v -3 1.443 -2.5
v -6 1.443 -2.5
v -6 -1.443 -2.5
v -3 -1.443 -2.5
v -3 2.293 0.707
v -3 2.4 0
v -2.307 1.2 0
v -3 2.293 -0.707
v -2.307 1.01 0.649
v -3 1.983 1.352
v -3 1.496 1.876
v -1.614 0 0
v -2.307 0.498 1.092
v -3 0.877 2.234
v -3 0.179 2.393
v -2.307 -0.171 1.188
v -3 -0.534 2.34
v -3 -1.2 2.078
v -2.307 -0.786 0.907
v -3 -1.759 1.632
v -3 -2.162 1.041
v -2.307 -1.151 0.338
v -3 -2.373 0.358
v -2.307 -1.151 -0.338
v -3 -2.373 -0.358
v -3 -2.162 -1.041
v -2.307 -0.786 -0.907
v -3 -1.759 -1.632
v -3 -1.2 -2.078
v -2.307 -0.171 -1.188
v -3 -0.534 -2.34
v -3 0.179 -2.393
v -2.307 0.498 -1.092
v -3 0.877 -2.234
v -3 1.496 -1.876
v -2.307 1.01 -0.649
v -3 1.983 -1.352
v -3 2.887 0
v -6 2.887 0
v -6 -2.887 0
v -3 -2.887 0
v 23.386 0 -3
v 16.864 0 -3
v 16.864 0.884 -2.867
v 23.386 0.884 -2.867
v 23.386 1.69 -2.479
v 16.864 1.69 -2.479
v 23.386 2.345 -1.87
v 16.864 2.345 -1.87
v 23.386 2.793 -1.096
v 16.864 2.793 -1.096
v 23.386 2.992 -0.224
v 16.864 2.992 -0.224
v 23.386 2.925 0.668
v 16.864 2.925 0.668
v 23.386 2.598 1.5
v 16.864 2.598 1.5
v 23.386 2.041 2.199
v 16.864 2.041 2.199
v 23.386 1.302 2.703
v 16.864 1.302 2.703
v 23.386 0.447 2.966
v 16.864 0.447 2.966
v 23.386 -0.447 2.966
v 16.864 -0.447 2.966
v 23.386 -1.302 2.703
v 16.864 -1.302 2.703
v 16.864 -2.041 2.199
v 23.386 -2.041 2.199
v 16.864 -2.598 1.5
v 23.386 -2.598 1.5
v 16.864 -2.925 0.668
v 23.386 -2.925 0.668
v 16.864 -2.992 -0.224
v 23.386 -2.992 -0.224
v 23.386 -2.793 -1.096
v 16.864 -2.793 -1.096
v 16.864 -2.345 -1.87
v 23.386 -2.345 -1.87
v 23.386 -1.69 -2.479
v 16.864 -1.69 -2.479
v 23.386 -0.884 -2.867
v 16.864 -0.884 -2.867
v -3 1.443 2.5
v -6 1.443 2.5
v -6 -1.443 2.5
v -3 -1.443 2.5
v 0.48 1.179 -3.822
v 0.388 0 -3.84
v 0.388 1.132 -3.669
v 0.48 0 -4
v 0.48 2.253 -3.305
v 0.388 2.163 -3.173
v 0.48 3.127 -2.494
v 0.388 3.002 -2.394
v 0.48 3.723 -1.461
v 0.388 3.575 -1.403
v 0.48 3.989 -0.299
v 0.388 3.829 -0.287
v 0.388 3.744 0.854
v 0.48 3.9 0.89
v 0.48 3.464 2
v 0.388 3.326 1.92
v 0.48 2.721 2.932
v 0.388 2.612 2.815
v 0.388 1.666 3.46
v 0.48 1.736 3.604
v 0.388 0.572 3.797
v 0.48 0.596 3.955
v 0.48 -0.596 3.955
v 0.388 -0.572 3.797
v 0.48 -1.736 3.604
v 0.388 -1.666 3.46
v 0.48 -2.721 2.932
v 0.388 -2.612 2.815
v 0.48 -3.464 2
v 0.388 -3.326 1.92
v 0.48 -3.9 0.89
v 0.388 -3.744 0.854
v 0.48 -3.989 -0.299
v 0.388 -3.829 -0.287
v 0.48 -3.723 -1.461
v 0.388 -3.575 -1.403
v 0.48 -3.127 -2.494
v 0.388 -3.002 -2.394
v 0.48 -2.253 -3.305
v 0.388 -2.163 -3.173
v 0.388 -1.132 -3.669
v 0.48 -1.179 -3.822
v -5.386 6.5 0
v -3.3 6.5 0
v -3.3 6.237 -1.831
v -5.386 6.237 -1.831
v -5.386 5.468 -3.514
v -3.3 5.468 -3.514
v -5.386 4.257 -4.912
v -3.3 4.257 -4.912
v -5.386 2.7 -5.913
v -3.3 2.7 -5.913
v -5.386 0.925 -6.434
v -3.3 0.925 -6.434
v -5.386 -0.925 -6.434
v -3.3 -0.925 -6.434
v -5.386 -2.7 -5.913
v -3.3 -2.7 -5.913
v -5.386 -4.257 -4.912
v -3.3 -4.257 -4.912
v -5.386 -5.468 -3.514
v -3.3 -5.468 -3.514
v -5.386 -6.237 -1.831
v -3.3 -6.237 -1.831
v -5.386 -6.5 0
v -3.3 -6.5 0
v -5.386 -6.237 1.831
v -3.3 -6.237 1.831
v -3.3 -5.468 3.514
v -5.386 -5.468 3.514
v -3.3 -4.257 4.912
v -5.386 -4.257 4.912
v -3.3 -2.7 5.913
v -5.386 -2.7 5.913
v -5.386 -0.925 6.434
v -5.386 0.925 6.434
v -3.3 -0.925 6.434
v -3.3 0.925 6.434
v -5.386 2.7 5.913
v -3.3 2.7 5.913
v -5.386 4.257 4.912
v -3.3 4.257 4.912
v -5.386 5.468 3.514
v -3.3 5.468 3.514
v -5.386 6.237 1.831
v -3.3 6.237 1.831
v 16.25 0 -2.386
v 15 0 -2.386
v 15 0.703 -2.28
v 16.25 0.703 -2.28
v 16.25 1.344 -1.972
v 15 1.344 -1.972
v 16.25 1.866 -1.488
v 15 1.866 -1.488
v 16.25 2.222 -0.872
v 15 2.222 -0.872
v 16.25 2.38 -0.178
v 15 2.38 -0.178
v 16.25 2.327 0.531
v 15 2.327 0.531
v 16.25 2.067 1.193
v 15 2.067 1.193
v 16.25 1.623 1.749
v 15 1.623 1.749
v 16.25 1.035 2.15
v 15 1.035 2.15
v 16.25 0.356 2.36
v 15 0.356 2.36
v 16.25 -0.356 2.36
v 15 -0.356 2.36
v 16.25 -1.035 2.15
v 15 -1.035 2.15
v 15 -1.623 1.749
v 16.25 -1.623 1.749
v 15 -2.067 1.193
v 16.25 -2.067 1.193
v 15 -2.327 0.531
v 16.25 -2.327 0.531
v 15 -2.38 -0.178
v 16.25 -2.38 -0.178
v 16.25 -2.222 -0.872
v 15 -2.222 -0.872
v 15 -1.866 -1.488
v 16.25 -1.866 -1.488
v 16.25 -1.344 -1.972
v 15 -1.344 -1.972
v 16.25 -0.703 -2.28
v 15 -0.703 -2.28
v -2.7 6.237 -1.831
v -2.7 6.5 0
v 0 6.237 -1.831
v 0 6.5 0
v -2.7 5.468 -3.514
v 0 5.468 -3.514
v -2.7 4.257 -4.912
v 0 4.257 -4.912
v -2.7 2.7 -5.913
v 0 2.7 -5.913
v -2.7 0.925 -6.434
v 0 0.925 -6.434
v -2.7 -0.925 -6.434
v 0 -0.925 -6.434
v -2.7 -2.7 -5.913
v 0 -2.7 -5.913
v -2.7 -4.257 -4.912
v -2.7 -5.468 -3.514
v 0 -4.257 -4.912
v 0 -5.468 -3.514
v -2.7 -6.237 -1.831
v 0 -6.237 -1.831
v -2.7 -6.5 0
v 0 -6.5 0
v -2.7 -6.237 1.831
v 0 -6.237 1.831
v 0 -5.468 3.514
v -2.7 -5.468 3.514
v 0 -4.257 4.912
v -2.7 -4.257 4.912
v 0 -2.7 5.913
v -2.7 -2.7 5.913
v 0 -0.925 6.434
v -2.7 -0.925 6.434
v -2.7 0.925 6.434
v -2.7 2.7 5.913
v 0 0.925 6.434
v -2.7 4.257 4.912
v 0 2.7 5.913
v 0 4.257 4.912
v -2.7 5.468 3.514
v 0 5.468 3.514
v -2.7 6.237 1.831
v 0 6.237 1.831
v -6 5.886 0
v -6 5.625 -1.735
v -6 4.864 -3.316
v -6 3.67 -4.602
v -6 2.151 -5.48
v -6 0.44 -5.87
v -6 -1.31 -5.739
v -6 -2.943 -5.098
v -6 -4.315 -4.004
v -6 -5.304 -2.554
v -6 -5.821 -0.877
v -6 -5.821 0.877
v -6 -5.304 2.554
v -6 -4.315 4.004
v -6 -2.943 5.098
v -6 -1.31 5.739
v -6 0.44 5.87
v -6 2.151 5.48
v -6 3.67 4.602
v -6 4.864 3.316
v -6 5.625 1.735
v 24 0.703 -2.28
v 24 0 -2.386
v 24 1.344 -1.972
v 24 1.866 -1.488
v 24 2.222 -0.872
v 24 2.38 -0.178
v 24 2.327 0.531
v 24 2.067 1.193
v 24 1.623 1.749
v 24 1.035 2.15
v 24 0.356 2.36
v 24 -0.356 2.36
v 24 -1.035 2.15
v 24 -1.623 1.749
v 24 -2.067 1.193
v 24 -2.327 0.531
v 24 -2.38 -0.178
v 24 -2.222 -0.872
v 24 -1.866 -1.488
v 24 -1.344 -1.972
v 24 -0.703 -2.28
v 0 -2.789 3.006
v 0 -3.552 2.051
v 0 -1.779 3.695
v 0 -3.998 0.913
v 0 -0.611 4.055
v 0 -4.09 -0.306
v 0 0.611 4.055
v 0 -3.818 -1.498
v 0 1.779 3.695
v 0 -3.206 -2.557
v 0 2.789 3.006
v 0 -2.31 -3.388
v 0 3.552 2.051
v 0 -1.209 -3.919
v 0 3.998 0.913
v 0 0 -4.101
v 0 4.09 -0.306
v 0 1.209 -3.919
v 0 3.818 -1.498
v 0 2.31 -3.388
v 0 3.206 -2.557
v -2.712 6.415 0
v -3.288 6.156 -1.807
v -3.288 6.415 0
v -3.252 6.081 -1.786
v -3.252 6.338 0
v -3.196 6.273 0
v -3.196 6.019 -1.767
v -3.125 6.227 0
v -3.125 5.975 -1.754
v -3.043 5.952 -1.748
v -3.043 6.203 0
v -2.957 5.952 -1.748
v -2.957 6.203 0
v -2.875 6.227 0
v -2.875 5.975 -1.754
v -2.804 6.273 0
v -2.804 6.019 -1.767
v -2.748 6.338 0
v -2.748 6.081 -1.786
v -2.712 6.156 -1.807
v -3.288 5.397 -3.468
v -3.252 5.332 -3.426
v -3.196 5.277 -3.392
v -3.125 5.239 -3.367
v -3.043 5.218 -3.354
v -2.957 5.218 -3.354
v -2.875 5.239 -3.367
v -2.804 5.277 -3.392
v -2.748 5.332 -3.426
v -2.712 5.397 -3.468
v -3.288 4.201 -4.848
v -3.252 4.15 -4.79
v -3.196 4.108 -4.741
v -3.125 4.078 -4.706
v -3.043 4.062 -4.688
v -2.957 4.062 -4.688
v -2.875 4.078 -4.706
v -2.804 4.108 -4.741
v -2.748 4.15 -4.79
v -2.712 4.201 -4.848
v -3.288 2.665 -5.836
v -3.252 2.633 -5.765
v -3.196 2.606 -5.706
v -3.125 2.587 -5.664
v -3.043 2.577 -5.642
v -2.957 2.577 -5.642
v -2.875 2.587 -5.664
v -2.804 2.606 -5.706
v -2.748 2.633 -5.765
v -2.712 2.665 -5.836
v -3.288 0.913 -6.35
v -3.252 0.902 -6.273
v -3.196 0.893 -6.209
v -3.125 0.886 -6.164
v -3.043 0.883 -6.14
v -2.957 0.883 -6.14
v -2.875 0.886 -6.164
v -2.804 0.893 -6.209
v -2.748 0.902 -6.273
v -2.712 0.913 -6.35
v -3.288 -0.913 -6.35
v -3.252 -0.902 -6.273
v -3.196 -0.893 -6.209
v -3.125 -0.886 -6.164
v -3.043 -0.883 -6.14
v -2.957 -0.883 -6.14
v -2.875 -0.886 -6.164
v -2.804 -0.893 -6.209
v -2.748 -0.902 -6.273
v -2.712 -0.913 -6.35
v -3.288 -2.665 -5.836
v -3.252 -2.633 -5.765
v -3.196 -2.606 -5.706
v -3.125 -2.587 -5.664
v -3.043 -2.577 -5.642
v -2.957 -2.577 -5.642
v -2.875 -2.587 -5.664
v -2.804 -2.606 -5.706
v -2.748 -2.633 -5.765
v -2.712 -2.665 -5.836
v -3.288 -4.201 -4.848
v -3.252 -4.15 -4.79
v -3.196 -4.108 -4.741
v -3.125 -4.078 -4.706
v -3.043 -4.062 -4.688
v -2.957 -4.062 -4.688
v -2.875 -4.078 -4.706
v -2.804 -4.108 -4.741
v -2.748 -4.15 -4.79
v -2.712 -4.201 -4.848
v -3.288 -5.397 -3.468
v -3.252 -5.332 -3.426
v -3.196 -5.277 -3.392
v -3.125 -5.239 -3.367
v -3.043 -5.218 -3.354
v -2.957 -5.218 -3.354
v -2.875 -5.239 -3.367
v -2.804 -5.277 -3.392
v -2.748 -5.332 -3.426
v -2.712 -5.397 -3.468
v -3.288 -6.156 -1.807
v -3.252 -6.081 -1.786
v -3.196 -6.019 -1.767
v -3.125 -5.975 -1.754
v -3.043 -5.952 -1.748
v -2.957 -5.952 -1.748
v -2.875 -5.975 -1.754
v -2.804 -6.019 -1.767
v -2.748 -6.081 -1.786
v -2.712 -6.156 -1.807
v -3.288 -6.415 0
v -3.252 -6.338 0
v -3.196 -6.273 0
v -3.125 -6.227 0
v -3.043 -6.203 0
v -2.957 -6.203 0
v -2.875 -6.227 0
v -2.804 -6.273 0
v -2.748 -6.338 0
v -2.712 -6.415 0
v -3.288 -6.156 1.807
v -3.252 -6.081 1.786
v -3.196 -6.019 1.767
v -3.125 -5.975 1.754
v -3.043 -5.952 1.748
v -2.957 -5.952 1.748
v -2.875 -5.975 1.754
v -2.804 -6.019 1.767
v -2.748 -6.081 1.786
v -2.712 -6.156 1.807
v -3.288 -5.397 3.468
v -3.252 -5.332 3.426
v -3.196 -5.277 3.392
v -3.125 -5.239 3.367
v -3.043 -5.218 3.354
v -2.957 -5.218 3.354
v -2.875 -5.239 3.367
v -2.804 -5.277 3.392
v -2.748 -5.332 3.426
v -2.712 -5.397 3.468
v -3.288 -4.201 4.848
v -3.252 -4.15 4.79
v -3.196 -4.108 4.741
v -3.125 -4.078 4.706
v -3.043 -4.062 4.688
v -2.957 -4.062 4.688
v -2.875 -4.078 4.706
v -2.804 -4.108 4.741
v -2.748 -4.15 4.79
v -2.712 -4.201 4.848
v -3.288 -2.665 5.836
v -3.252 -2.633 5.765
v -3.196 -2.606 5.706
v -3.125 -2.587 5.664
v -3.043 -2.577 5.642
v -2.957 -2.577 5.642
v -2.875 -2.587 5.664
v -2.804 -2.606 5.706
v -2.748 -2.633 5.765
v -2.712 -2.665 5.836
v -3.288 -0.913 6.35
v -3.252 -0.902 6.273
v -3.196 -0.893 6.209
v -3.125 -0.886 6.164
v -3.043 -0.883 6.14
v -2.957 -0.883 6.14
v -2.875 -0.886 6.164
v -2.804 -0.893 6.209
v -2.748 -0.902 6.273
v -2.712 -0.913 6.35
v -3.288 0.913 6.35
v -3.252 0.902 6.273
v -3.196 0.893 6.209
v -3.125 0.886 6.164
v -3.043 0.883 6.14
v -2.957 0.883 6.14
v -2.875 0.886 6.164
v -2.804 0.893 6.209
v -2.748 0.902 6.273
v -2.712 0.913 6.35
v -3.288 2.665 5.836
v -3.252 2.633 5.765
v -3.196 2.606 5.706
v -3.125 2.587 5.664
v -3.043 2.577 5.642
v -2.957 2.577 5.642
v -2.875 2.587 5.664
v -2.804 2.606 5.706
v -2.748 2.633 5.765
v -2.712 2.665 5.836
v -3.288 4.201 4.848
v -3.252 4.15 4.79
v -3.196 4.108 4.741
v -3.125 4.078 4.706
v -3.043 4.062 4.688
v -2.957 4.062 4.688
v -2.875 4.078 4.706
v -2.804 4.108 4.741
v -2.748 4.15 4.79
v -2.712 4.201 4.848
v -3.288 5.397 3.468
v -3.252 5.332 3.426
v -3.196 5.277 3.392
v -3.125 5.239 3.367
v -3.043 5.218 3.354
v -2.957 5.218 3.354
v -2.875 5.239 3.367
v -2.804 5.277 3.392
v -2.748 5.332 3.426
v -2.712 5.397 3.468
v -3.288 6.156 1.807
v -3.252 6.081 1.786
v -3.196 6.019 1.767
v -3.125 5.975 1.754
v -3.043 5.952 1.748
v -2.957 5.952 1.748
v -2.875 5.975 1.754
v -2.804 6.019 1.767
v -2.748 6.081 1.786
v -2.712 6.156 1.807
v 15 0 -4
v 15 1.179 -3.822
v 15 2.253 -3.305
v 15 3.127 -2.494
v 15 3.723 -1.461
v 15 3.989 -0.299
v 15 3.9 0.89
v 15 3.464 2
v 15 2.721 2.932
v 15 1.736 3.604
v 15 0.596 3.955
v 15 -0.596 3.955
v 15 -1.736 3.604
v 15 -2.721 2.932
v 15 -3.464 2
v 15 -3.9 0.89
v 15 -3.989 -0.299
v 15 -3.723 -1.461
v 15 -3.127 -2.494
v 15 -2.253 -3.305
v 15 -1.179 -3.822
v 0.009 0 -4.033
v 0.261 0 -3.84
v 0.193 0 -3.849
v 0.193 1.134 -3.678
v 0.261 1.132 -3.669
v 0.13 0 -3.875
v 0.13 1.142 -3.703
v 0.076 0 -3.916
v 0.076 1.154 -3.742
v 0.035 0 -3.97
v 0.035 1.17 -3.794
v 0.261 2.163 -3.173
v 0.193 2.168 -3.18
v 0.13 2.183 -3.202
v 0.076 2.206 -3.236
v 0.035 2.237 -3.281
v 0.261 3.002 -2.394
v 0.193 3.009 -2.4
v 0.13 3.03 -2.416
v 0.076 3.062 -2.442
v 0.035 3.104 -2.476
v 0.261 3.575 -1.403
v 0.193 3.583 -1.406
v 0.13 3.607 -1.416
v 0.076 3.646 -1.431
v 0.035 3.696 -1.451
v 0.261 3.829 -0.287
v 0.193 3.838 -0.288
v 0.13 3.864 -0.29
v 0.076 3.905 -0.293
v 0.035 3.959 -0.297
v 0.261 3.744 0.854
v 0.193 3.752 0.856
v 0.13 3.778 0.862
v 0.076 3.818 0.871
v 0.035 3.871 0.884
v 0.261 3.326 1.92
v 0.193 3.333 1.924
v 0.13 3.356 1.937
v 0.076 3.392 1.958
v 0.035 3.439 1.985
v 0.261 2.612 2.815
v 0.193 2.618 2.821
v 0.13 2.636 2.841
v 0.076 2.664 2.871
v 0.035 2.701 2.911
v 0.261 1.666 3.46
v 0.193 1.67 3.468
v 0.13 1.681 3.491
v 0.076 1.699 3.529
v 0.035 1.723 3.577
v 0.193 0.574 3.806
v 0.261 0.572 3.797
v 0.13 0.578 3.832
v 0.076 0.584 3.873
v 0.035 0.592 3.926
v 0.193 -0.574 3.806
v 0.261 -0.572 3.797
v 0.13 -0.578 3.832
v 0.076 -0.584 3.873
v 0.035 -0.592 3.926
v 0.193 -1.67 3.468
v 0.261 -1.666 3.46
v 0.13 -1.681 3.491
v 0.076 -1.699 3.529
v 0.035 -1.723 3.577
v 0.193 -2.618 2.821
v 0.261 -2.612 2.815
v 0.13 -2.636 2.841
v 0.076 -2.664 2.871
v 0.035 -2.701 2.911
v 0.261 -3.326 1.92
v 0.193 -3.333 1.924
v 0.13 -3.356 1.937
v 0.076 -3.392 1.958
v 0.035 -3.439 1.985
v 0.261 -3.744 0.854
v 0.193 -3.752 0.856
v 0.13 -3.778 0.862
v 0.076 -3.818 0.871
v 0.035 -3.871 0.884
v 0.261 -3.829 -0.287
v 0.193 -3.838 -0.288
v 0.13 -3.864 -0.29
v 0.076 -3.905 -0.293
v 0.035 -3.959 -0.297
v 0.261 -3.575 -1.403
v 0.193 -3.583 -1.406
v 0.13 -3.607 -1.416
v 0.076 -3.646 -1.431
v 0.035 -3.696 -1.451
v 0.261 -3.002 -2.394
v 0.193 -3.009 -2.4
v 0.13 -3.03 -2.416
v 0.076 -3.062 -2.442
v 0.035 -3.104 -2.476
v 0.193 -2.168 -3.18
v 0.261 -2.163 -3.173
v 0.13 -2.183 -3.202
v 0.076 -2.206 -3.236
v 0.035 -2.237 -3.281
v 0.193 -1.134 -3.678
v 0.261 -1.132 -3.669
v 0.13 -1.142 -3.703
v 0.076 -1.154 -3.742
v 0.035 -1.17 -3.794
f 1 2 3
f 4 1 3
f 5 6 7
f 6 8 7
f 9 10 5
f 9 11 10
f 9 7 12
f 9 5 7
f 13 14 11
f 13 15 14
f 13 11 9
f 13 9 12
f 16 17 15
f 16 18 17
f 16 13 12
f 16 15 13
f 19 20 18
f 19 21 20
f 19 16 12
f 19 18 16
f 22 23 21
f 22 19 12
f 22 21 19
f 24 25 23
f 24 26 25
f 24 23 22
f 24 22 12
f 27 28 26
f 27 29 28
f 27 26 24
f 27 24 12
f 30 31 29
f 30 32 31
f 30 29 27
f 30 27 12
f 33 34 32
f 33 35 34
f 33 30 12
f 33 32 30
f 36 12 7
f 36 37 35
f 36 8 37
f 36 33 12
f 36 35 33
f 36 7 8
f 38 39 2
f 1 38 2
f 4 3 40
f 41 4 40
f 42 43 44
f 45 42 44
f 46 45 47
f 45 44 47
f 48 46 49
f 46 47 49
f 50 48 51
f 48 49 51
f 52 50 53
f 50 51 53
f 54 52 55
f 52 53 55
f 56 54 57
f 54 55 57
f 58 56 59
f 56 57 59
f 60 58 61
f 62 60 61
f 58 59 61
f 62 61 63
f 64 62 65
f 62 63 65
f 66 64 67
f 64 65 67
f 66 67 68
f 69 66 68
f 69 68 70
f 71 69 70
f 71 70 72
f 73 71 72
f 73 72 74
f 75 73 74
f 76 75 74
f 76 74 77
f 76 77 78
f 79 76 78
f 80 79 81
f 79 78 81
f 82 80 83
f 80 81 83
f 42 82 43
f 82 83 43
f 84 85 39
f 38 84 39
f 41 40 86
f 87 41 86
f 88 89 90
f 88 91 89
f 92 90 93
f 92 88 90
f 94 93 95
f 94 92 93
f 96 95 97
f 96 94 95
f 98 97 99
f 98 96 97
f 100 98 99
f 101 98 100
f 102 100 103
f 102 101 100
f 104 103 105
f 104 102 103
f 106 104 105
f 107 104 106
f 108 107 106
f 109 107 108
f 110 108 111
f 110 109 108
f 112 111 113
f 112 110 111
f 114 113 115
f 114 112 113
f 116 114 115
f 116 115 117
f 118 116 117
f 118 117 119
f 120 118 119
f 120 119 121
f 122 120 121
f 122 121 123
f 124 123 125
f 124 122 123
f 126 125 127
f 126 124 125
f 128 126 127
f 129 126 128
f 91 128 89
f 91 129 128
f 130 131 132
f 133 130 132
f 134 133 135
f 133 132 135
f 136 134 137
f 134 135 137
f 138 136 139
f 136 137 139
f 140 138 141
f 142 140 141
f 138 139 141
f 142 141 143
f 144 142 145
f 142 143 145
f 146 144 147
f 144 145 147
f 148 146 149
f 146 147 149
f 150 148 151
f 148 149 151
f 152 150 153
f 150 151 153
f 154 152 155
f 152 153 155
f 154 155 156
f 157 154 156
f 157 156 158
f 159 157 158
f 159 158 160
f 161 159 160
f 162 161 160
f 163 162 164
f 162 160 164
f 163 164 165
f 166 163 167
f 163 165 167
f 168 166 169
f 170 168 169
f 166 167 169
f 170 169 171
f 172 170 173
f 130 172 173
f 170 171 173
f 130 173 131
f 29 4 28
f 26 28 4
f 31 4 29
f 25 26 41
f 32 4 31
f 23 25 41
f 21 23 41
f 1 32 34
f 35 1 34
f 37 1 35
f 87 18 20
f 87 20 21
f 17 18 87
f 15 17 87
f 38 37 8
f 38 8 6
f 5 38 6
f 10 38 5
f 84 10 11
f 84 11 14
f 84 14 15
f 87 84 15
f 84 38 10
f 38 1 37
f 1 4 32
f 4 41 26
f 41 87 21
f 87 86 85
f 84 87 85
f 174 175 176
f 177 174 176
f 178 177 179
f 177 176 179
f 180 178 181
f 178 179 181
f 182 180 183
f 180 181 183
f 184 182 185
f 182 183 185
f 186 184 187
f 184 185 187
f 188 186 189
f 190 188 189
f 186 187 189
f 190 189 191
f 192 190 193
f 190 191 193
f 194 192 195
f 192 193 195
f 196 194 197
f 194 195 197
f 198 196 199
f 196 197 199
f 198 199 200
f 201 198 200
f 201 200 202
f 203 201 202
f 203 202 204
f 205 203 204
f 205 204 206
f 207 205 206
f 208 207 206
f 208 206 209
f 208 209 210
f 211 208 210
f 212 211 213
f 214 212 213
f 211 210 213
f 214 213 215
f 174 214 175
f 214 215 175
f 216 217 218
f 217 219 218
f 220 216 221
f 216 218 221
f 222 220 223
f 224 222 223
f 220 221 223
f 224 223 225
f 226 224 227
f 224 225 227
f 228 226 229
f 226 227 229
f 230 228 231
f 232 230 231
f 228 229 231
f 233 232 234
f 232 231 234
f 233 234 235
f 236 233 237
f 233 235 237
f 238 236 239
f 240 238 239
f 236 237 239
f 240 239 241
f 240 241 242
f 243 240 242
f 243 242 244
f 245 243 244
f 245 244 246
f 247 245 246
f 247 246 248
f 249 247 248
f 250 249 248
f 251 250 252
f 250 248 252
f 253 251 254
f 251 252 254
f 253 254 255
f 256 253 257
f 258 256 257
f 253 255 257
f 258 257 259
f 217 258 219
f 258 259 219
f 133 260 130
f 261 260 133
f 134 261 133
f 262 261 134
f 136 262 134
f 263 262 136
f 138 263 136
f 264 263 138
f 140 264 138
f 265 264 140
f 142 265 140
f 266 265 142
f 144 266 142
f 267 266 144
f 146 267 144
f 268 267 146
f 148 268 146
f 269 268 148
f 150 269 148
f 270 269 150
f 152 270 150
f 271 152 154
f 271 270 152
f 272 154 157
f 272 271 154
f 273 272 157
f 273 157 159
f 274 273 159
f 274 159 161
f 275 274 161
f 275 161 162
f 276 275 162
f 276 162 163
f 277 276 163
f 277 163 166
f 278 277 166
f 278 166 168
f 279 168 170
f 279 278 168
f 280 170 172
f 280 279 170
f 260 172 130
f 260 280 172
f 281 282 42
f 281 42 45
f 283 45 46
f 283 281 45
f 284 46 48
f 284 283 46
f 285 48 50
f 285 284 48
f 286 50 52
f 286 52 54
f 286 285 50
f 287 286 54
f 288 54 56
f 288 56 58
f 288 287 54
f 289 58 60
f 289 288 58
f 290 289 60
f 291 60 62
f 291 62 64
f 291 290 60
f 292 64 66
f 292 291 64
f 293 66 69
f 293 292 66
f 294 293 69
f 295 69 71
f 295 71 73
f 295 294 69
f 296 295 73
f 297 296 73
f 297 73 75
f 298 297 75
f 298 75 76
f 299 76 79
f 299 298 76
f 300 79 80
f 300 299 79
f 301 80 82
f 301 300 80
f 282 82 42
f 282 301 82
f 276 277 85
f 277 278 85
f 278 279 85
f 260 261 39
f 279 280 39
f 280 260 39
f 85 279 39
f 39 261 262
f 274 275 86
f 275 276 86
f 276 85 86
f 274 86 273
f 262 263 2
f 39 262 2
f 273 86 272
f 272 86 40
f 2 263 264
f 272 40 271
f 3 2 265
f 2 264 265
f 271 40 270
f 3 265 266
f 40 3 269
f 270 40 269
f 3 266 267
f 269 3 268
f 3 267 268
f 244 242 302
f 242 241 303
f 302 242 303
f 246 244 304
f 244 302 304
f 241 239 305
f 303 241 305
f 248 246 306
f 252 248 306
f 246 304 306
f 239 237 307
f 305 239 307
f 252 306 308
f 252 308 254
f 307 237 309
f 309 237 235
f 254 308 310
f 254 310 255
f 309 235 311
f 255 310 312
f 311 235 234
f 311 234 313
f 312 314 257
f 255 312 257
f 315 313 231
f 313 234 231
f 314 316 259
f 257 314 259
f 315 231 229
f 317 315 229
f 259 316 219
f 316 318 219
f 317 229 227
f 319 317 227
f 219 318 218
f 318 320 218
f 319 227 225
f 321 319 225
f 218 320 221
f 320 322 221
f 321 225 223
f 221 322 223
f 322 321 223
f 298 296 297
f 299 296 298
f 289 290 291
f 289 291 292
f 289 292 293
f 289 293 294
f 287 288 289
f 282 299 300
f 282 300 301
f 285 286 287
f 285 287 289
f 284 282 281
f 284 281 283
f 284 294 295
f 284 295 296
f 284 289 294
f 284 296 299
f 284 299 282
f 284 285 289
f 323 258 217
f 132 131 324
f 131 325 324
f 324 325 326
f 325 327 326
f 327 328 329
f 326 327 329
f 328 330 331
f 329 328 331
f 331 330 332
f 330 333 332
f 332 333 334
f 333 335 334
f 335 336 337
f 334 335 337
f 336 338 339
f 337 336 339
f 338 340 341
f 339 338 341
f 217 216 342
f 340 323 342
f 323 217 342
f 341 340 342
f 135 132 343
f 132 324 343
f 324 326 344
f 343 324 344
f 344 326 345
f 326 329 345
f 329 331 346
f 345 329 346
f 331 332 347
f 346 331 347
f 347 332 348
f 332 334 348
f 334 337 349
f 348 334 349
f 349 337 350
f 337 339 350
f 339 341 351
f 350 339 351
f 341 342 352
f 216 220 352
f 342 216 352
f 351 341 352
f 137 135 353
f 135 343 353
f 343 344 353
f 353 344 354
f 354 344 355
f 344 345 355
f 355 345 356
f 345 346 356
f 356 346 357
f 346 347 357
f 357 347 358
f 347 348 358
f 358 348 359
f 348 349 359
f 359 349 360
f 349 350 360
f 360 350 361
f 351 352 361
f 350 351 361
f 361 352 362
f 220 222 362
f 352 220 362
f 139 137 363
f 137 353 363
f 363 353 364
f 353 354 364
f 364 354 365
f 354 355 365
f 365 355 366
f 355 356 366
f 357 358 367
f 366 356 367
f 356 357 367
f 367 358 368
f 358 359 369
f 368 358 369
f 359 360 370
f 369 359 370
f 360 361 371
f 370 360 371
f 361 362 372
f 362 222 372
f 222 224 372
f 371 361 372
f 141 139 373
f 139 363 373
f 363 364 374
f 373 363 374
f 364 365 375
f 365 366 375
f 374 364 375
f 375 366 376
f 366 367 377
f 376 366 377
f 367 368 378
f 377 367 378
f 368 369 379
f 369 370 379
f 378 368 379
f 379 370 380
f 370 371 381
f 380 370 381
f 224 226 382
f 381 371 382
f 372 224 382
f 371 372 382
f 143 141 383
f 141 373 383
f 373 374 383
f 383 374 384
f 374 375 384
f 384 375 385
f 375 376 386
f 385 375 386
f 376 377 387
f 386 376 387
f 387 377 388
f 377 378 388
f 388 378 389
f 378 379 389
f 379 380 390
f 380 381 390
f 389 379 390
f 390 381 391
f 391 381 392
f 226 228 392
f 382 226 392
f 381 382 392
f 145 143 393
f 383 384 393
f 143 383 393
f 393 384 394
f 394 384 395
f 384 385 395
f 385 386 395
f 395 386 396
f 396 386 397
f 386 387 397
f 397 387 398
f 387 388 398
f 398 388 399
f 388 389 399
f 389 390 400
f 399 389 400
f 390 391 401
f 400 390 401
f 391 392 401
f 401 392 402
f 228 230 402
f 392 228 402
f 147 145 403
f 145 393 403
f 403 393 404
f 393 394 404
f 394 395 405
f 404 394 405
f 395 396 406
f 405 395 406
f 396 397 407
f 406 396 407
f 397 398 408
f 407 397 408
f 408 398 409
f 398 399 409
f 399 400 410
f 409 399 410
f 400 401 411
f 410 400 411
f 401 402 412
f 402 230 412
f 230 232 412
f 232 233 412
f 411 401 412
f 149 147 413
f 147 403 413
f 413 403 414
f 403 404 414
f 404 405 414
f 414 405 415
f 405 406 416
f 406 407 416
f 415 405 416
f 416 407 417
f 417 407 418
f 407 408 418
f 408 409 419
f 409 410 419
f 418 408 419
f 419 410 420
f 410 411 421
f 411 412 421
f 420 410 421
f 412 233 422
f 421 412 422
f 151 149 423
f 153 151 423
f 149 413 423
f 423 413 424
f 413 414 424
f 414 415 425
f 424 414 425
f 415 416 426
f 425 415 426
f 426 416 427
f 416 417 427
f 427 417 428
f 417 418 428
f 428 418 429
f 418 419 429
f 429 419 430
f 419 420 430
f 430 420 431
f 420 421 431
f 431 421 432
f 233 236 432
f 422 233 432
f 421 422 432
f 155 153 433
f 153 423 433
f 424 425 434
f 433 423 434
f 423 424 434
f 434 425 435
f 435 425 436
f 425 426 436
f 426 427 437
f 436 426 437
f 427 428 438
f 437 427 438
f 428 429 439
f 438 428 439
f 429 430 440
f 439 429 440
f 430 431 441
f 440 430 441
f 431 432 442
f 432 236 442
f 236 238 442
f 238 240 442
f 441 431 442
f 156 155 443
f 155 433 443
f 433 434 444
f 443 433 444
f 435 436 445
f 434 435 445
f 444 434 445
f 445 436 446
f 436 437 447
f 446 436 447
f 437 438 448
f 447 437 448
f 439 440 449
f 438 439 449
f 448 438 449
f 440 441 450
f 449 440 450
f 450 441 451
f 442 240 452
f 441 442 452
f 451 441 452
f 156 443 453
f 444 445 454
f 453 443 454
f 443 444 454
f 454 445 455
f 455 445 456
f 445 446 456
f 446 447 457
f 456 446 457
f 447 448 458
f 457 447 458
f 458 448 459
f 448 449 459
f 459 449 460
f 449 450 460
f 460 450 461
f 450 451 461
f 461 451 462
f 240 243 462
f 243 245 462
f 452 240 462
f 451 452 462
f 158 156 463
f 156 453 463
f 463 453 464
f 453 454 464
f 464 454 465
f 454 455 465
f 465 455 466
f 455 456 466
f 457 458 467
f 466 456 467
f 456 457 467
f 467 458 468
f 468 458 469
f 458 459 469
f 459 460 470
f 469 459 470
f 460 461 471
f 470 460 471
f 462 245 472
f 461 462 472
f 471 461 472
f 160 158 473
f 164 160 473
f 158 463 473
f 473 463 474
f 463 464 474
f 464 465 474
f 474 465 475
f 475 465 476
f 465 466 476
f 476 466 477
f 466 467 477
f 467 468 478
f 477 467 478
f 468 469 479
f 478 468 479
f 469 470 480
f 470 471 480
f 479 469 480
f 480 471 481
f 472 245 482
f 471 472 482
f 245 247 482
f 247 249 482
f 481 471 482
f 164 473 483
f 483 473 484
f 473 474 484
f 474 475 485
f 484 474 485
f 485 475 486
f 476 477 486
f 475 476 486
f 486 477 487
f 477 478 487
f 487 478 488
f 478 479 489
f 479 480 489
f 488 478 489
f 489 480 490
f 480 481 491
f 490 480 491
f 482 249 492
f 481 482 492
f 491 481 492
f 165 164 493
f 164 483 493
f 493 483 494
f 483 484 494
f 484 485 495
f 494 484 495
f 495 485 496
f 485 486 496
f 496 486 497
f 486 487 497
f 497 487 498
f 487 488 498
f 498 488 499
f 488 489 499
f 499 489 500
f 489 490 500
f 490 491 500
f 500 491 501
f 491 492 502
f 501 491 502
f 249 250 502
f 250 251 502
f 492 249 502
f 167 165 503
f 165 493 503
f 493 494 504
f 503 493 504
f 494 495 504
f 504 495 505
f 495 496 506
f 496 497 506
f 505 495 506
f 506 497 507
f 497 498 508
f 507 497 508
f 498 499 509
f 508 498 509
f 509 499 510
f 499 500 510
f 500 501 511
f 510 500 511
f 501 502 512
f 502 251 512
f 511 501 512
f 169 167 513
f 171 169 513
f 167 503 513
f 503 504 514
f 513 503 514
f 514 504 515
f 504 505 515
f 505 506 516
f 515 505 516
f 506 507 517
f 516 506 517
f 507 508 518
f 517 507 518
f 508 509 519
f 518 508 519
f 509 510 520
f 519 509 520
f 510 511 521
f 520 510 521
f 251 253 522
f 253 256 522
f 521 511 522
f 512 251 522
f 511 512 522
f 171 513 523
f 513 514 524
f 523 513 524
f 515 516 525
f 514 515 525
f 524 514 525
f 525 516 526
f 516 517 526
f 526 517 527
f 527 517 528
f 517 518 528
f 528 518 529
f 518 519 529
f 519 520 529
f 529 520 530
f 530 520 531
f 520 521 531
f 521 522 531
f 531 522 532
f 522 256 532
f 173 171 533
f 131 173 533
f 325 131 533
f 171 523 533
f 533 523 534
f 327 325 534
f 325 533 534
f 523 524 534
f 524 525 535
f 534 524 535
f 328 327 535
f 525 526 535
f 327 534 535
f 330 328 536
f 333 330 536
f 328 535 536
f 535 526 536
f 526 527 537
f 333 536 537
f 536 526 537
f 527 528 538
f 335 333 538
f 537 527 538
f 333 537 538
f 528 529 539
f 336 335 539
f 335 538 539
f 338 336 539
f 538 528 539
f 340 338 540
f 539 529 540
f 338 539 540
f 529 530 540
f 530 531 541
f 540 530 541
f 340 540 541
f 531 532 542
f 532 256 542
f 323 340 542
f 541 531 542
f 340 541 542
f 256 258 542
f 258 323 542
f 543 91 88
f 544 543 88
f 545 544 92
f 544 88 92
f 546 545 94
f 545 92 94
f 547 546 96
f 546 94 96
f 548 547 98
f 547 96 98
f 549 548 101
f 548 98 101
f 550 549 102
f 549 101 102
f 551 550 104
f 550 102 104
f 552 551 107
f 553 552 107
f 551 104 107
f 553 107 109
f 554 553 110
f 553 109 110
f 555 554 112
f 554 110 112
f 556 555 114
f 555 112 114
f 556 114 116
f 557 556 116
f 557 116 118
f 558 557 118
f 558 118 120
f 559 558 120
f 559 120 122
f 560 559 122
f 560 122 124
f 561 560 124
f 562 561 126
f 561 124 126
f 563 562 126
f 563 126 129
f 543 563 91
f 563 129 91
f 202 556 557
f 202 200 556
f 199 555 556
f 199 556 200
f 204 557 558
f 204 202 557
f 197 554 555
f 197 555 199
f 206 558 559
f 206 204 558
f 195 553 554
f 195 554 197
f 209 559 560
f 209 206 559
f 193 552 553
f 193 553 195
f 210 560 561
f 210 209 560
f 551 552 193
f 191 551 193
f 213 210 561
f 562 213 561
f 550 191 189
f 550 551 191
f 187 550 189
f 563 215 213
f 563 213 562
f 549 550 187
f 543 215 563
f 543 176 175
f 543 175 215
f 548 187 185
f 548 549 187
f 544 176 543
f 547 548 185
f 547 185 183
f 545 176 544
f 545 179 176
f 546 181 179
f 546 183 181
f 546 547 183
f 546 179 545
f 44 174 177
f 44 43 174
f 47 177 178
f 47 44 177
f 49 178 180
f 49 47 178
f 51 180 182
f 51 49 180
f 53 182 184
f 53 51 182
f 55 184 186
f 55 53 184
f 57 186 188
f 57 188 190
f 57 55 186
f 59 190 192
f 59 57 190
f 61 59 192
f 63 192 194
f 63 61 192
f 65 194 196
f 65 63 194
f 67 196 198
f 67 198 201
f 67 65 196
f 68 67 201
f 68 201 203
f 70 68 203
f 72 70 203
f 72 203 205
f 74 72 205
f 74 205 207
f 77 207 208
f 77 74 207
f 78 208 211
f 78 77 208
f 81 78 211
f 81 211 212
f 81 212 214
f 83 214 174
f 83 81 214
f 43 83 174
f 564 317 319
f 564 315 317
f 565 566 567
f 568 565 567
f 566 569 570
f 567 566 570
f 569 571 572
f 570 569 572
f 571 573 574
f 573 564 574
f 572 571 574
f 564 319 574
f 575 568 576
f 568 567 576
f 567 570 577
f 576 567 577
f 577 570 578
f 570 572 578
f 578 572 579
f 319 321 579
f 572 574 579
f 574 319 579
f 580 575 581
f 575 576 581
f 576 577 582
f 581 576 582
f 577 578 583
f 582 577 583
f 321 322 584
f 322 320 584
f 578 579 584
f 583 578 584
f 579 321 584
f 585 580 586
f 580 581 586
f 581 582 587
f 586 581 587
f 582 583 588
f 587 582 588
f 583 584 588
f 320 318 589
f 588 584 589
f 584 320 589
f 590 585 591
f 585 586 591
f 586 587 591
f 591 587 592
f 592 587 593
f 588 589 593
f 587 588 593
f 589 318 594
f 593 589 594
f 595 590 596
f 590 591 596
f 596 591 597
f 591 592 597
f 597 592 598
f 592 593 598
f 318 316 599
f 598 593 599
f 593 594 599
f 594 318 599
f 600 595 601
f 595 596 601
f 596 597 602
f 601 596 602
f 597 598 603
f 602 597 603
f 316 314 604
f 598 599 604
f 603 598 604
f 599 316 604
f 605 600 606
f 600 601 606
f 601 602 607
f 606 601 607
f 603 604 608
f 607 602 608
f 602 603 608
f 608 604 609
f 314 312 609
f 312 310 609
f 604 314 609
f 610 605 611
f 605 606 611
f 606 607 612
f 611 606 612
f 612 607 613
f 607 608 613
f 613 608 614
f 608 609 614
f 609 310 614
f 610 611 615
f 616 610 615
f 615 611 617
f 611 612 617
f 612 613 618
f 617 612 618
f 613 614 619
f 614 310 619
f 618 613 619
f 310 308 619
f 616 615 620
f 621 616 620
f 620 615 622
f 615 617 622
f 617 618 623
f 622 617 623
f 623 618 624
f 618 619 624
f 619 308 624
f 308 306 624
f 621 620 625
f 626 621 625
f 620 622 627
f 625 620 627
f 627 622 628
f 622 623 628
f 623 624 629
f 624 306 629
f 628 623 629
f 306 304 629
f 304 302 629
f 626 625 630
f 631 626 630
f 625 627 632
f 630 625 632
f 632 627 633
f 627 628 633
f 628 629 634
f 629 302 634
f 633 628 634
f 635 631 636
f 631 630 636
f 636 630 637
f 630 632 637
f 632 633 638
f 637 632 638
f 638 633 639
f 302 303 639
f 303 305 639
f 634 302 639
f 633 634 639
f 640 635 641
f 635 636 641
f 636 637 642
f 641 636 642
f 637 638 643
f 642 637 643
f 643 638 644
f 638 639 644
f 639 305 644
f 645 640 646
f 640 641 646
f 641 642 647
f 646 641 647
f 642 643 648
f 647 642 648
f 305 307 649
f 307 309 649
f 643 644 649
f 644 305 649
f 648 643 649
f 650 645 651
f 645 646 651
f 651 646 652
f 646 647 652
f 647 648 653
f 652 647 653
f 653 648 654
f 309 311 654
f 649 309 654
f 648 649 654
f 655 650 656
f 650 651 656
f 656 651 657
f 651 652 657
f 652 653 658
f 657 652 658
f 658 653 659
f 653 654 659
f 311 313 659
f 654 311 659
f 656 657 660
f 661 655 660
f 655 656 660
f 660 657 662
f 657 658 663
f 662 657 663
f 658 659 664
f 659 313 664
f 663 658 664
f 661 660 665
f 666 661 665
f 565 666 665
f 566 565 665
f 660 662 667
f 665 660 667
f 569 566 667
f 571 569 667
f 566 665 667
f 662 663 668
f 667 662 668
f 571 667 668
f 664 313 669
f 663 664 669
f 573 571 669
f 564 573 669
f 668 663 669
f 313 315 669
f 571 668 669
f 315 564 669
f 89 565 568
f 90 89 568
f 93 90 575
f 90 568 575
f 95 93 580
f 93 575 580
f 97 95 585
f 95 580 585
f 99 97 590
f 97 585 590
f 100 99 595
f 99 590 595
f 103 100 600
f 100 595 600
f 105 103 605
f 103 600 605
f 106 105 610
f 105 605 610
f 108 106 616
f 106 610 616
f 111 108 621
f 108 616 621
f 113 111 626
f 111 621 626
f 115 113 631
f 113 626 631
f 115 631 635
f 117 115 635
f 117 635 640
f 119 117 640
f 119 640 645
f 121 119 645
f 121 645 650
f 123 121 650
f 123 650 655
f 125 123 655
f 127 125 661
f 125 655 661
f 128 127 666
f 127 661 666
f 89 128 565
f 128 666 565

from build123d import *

# Parameters (mm, degrees)
SKETCH2_R           = 3.84
BOSS_EXTRUDE1_DEPTH = 0.387623957
SKETCH3_R           = 3.84
BOSS_EXTRUDE2_DEPTH = 0.092376043
BOSS_EXTRUDE2_TAPER = -60.000000004
SKETCH4_R           = 4
BOSS_EXTRUDE3_DEPTH = 14.52
SKETCH5_R           = 2.3865
BOSS_EXTRUDE4_DEPTH = 1.25
SKETCH6_R           = 2.3865
BOSS_EXTRUDE5_DEPTH = 0.6135
BOSS_EXTRUDE5_TAPER = -45
SKETCH7_R           = 3
BOSS_EXTRUDE6_DEPTH = 7.1365
CUT_EXTRUDE1_DEPTH  = 3
CHAMFER1_SIZE       = 0.6135
FILLET1_R           = 0.261


with BuildPart() as part:
    # Sketch1 → Revolve1 (revolve)
    with BuildSketch(Plane(origin=(0, 0, 0), x_dir=(-1, 0, 0), z_dir=(0, 0, -1))):
        with BuildLine():
            Line((0, 6.5), (0, 0))
            Line((0, 0), (6, 0))
            Line((6, 0), (6, 6.5))
            Line((6, 6.5), (3.3, 6.5))
            ThreePointArc((3.3, 6.5), (3, 6.2), (2.7, 6.5))
            Line((2.7, 6.5), (0, 6.5))
        make_face()
    revolve(axis=Axis((0, 0, 0), (-1, 0, 0)))

    # Sketch2 → Boss-Extrude1 (add)
    with BuildSketch(Plane(origin=(0, 0, 0), x_dir=(0, 0, -1), z_dir=(1, 0, 0))):
        Circle(SKETCH2_R)
    extrude(amount=BOSS_EXTRUDE1_DEPTH)

    # Sketch3 → Boss-Extrude2 (add)
    with BuildSketch(Plane(origin=(0.387623957, 0, 0), x_dir=(0, 0, -1), z_dir=(1, 0, 0))):
        Circle(SKETCH3_R)
    extrude(amount=BOSS_EXTRUDE2_DEPTH, taper=BOSS_EXTRUDE2_TAPER)

    # Sketch4 → Boss-Extrude3 (add)
    with BuildSketch(Plane(origin=(0.48, 0, 0), x_dir=(0, 0, -1), z_dir=(1, 0, 0))):
        Circle(SKETCH4_R)
    extrude(amount=BOSS_EXTRUDE3_DEPTH)

    # Sketch5 → Boss-Extrude4 (add)
    with BuildSketch(Plane(origin=(15, 0, 0), x_dir=(0, 0, -1), z_dir=(1, 0, 0))):
        Circle(SKETCH5_R)
    extrude(amount=BOSS_EXTRUDE4_DEPTH)

    # Sketch6 → Boss-Extrude5 (add)
    with BuildSketch(Plane(origin=(16.25, 0, 0), x_dir=(0, 0, -1), z_dir=(1, 0, 0))):
        Circle(SKETCH6_R)
    extrude(amount=BOSS_EXTRUDE5_DEPTH, taper=BOSS_EXTRUDE5_TAPER)

    # Sketch7 → Boss-Extrude6 (add)
    with BuildSketch(Plane(origin=(16.8635, 0, 0), x_dir=(0, 0, -1), z_dir=(1, 0, 0))):
        Circle(SKETCH7_R)
    extrude(amount=BOSS_EXTRUDE6_DEPTH)

    # Sketch8 → Cut-Extrude1 (cut)
    with BuildSketch(Plane.ZY.offset(6)):
        Polygon((2.5, -1.443375673), (2.5, 1.443375673), (0, 2.886751346), (-2.5, 1.443375673), (-2.5, -1.443375673), (0, -2.886751346), align=None)
    extrude(amount=-CUT_EXTRUDE1_DEPTH, mode=Mode.SUBTRACT)

    # Sketch9 → Cut-Revolve1 (revolve, cut)
    with BuildSketch(Plane.XY):
        Polygon((-3, 2.4), (-3, 0), (-1.614359354, 0), align=None)
    revolve(axis=Axis((-3, 0, 0), (1, 0, 0)), mode=Mode.SUBTRACT)

    # Chamfer1
    chamfer1_edges = [part.edges().sort_by_distance(p)[0] for p in [
        (24, 0, 3),
        (-6, -6.5, 0),
    ]]
    chamfer(chamfer1_edges, length=CHAMFER1_SIZE)

    # Fillet1
    fillet1_edges = [part.edges().sort_by_distance(p)[0] for p in [
        (0, 0, 3.84),
    ]]
    fillet(fillet1_edges, radius=FILLET1_R)


solid = part.part
